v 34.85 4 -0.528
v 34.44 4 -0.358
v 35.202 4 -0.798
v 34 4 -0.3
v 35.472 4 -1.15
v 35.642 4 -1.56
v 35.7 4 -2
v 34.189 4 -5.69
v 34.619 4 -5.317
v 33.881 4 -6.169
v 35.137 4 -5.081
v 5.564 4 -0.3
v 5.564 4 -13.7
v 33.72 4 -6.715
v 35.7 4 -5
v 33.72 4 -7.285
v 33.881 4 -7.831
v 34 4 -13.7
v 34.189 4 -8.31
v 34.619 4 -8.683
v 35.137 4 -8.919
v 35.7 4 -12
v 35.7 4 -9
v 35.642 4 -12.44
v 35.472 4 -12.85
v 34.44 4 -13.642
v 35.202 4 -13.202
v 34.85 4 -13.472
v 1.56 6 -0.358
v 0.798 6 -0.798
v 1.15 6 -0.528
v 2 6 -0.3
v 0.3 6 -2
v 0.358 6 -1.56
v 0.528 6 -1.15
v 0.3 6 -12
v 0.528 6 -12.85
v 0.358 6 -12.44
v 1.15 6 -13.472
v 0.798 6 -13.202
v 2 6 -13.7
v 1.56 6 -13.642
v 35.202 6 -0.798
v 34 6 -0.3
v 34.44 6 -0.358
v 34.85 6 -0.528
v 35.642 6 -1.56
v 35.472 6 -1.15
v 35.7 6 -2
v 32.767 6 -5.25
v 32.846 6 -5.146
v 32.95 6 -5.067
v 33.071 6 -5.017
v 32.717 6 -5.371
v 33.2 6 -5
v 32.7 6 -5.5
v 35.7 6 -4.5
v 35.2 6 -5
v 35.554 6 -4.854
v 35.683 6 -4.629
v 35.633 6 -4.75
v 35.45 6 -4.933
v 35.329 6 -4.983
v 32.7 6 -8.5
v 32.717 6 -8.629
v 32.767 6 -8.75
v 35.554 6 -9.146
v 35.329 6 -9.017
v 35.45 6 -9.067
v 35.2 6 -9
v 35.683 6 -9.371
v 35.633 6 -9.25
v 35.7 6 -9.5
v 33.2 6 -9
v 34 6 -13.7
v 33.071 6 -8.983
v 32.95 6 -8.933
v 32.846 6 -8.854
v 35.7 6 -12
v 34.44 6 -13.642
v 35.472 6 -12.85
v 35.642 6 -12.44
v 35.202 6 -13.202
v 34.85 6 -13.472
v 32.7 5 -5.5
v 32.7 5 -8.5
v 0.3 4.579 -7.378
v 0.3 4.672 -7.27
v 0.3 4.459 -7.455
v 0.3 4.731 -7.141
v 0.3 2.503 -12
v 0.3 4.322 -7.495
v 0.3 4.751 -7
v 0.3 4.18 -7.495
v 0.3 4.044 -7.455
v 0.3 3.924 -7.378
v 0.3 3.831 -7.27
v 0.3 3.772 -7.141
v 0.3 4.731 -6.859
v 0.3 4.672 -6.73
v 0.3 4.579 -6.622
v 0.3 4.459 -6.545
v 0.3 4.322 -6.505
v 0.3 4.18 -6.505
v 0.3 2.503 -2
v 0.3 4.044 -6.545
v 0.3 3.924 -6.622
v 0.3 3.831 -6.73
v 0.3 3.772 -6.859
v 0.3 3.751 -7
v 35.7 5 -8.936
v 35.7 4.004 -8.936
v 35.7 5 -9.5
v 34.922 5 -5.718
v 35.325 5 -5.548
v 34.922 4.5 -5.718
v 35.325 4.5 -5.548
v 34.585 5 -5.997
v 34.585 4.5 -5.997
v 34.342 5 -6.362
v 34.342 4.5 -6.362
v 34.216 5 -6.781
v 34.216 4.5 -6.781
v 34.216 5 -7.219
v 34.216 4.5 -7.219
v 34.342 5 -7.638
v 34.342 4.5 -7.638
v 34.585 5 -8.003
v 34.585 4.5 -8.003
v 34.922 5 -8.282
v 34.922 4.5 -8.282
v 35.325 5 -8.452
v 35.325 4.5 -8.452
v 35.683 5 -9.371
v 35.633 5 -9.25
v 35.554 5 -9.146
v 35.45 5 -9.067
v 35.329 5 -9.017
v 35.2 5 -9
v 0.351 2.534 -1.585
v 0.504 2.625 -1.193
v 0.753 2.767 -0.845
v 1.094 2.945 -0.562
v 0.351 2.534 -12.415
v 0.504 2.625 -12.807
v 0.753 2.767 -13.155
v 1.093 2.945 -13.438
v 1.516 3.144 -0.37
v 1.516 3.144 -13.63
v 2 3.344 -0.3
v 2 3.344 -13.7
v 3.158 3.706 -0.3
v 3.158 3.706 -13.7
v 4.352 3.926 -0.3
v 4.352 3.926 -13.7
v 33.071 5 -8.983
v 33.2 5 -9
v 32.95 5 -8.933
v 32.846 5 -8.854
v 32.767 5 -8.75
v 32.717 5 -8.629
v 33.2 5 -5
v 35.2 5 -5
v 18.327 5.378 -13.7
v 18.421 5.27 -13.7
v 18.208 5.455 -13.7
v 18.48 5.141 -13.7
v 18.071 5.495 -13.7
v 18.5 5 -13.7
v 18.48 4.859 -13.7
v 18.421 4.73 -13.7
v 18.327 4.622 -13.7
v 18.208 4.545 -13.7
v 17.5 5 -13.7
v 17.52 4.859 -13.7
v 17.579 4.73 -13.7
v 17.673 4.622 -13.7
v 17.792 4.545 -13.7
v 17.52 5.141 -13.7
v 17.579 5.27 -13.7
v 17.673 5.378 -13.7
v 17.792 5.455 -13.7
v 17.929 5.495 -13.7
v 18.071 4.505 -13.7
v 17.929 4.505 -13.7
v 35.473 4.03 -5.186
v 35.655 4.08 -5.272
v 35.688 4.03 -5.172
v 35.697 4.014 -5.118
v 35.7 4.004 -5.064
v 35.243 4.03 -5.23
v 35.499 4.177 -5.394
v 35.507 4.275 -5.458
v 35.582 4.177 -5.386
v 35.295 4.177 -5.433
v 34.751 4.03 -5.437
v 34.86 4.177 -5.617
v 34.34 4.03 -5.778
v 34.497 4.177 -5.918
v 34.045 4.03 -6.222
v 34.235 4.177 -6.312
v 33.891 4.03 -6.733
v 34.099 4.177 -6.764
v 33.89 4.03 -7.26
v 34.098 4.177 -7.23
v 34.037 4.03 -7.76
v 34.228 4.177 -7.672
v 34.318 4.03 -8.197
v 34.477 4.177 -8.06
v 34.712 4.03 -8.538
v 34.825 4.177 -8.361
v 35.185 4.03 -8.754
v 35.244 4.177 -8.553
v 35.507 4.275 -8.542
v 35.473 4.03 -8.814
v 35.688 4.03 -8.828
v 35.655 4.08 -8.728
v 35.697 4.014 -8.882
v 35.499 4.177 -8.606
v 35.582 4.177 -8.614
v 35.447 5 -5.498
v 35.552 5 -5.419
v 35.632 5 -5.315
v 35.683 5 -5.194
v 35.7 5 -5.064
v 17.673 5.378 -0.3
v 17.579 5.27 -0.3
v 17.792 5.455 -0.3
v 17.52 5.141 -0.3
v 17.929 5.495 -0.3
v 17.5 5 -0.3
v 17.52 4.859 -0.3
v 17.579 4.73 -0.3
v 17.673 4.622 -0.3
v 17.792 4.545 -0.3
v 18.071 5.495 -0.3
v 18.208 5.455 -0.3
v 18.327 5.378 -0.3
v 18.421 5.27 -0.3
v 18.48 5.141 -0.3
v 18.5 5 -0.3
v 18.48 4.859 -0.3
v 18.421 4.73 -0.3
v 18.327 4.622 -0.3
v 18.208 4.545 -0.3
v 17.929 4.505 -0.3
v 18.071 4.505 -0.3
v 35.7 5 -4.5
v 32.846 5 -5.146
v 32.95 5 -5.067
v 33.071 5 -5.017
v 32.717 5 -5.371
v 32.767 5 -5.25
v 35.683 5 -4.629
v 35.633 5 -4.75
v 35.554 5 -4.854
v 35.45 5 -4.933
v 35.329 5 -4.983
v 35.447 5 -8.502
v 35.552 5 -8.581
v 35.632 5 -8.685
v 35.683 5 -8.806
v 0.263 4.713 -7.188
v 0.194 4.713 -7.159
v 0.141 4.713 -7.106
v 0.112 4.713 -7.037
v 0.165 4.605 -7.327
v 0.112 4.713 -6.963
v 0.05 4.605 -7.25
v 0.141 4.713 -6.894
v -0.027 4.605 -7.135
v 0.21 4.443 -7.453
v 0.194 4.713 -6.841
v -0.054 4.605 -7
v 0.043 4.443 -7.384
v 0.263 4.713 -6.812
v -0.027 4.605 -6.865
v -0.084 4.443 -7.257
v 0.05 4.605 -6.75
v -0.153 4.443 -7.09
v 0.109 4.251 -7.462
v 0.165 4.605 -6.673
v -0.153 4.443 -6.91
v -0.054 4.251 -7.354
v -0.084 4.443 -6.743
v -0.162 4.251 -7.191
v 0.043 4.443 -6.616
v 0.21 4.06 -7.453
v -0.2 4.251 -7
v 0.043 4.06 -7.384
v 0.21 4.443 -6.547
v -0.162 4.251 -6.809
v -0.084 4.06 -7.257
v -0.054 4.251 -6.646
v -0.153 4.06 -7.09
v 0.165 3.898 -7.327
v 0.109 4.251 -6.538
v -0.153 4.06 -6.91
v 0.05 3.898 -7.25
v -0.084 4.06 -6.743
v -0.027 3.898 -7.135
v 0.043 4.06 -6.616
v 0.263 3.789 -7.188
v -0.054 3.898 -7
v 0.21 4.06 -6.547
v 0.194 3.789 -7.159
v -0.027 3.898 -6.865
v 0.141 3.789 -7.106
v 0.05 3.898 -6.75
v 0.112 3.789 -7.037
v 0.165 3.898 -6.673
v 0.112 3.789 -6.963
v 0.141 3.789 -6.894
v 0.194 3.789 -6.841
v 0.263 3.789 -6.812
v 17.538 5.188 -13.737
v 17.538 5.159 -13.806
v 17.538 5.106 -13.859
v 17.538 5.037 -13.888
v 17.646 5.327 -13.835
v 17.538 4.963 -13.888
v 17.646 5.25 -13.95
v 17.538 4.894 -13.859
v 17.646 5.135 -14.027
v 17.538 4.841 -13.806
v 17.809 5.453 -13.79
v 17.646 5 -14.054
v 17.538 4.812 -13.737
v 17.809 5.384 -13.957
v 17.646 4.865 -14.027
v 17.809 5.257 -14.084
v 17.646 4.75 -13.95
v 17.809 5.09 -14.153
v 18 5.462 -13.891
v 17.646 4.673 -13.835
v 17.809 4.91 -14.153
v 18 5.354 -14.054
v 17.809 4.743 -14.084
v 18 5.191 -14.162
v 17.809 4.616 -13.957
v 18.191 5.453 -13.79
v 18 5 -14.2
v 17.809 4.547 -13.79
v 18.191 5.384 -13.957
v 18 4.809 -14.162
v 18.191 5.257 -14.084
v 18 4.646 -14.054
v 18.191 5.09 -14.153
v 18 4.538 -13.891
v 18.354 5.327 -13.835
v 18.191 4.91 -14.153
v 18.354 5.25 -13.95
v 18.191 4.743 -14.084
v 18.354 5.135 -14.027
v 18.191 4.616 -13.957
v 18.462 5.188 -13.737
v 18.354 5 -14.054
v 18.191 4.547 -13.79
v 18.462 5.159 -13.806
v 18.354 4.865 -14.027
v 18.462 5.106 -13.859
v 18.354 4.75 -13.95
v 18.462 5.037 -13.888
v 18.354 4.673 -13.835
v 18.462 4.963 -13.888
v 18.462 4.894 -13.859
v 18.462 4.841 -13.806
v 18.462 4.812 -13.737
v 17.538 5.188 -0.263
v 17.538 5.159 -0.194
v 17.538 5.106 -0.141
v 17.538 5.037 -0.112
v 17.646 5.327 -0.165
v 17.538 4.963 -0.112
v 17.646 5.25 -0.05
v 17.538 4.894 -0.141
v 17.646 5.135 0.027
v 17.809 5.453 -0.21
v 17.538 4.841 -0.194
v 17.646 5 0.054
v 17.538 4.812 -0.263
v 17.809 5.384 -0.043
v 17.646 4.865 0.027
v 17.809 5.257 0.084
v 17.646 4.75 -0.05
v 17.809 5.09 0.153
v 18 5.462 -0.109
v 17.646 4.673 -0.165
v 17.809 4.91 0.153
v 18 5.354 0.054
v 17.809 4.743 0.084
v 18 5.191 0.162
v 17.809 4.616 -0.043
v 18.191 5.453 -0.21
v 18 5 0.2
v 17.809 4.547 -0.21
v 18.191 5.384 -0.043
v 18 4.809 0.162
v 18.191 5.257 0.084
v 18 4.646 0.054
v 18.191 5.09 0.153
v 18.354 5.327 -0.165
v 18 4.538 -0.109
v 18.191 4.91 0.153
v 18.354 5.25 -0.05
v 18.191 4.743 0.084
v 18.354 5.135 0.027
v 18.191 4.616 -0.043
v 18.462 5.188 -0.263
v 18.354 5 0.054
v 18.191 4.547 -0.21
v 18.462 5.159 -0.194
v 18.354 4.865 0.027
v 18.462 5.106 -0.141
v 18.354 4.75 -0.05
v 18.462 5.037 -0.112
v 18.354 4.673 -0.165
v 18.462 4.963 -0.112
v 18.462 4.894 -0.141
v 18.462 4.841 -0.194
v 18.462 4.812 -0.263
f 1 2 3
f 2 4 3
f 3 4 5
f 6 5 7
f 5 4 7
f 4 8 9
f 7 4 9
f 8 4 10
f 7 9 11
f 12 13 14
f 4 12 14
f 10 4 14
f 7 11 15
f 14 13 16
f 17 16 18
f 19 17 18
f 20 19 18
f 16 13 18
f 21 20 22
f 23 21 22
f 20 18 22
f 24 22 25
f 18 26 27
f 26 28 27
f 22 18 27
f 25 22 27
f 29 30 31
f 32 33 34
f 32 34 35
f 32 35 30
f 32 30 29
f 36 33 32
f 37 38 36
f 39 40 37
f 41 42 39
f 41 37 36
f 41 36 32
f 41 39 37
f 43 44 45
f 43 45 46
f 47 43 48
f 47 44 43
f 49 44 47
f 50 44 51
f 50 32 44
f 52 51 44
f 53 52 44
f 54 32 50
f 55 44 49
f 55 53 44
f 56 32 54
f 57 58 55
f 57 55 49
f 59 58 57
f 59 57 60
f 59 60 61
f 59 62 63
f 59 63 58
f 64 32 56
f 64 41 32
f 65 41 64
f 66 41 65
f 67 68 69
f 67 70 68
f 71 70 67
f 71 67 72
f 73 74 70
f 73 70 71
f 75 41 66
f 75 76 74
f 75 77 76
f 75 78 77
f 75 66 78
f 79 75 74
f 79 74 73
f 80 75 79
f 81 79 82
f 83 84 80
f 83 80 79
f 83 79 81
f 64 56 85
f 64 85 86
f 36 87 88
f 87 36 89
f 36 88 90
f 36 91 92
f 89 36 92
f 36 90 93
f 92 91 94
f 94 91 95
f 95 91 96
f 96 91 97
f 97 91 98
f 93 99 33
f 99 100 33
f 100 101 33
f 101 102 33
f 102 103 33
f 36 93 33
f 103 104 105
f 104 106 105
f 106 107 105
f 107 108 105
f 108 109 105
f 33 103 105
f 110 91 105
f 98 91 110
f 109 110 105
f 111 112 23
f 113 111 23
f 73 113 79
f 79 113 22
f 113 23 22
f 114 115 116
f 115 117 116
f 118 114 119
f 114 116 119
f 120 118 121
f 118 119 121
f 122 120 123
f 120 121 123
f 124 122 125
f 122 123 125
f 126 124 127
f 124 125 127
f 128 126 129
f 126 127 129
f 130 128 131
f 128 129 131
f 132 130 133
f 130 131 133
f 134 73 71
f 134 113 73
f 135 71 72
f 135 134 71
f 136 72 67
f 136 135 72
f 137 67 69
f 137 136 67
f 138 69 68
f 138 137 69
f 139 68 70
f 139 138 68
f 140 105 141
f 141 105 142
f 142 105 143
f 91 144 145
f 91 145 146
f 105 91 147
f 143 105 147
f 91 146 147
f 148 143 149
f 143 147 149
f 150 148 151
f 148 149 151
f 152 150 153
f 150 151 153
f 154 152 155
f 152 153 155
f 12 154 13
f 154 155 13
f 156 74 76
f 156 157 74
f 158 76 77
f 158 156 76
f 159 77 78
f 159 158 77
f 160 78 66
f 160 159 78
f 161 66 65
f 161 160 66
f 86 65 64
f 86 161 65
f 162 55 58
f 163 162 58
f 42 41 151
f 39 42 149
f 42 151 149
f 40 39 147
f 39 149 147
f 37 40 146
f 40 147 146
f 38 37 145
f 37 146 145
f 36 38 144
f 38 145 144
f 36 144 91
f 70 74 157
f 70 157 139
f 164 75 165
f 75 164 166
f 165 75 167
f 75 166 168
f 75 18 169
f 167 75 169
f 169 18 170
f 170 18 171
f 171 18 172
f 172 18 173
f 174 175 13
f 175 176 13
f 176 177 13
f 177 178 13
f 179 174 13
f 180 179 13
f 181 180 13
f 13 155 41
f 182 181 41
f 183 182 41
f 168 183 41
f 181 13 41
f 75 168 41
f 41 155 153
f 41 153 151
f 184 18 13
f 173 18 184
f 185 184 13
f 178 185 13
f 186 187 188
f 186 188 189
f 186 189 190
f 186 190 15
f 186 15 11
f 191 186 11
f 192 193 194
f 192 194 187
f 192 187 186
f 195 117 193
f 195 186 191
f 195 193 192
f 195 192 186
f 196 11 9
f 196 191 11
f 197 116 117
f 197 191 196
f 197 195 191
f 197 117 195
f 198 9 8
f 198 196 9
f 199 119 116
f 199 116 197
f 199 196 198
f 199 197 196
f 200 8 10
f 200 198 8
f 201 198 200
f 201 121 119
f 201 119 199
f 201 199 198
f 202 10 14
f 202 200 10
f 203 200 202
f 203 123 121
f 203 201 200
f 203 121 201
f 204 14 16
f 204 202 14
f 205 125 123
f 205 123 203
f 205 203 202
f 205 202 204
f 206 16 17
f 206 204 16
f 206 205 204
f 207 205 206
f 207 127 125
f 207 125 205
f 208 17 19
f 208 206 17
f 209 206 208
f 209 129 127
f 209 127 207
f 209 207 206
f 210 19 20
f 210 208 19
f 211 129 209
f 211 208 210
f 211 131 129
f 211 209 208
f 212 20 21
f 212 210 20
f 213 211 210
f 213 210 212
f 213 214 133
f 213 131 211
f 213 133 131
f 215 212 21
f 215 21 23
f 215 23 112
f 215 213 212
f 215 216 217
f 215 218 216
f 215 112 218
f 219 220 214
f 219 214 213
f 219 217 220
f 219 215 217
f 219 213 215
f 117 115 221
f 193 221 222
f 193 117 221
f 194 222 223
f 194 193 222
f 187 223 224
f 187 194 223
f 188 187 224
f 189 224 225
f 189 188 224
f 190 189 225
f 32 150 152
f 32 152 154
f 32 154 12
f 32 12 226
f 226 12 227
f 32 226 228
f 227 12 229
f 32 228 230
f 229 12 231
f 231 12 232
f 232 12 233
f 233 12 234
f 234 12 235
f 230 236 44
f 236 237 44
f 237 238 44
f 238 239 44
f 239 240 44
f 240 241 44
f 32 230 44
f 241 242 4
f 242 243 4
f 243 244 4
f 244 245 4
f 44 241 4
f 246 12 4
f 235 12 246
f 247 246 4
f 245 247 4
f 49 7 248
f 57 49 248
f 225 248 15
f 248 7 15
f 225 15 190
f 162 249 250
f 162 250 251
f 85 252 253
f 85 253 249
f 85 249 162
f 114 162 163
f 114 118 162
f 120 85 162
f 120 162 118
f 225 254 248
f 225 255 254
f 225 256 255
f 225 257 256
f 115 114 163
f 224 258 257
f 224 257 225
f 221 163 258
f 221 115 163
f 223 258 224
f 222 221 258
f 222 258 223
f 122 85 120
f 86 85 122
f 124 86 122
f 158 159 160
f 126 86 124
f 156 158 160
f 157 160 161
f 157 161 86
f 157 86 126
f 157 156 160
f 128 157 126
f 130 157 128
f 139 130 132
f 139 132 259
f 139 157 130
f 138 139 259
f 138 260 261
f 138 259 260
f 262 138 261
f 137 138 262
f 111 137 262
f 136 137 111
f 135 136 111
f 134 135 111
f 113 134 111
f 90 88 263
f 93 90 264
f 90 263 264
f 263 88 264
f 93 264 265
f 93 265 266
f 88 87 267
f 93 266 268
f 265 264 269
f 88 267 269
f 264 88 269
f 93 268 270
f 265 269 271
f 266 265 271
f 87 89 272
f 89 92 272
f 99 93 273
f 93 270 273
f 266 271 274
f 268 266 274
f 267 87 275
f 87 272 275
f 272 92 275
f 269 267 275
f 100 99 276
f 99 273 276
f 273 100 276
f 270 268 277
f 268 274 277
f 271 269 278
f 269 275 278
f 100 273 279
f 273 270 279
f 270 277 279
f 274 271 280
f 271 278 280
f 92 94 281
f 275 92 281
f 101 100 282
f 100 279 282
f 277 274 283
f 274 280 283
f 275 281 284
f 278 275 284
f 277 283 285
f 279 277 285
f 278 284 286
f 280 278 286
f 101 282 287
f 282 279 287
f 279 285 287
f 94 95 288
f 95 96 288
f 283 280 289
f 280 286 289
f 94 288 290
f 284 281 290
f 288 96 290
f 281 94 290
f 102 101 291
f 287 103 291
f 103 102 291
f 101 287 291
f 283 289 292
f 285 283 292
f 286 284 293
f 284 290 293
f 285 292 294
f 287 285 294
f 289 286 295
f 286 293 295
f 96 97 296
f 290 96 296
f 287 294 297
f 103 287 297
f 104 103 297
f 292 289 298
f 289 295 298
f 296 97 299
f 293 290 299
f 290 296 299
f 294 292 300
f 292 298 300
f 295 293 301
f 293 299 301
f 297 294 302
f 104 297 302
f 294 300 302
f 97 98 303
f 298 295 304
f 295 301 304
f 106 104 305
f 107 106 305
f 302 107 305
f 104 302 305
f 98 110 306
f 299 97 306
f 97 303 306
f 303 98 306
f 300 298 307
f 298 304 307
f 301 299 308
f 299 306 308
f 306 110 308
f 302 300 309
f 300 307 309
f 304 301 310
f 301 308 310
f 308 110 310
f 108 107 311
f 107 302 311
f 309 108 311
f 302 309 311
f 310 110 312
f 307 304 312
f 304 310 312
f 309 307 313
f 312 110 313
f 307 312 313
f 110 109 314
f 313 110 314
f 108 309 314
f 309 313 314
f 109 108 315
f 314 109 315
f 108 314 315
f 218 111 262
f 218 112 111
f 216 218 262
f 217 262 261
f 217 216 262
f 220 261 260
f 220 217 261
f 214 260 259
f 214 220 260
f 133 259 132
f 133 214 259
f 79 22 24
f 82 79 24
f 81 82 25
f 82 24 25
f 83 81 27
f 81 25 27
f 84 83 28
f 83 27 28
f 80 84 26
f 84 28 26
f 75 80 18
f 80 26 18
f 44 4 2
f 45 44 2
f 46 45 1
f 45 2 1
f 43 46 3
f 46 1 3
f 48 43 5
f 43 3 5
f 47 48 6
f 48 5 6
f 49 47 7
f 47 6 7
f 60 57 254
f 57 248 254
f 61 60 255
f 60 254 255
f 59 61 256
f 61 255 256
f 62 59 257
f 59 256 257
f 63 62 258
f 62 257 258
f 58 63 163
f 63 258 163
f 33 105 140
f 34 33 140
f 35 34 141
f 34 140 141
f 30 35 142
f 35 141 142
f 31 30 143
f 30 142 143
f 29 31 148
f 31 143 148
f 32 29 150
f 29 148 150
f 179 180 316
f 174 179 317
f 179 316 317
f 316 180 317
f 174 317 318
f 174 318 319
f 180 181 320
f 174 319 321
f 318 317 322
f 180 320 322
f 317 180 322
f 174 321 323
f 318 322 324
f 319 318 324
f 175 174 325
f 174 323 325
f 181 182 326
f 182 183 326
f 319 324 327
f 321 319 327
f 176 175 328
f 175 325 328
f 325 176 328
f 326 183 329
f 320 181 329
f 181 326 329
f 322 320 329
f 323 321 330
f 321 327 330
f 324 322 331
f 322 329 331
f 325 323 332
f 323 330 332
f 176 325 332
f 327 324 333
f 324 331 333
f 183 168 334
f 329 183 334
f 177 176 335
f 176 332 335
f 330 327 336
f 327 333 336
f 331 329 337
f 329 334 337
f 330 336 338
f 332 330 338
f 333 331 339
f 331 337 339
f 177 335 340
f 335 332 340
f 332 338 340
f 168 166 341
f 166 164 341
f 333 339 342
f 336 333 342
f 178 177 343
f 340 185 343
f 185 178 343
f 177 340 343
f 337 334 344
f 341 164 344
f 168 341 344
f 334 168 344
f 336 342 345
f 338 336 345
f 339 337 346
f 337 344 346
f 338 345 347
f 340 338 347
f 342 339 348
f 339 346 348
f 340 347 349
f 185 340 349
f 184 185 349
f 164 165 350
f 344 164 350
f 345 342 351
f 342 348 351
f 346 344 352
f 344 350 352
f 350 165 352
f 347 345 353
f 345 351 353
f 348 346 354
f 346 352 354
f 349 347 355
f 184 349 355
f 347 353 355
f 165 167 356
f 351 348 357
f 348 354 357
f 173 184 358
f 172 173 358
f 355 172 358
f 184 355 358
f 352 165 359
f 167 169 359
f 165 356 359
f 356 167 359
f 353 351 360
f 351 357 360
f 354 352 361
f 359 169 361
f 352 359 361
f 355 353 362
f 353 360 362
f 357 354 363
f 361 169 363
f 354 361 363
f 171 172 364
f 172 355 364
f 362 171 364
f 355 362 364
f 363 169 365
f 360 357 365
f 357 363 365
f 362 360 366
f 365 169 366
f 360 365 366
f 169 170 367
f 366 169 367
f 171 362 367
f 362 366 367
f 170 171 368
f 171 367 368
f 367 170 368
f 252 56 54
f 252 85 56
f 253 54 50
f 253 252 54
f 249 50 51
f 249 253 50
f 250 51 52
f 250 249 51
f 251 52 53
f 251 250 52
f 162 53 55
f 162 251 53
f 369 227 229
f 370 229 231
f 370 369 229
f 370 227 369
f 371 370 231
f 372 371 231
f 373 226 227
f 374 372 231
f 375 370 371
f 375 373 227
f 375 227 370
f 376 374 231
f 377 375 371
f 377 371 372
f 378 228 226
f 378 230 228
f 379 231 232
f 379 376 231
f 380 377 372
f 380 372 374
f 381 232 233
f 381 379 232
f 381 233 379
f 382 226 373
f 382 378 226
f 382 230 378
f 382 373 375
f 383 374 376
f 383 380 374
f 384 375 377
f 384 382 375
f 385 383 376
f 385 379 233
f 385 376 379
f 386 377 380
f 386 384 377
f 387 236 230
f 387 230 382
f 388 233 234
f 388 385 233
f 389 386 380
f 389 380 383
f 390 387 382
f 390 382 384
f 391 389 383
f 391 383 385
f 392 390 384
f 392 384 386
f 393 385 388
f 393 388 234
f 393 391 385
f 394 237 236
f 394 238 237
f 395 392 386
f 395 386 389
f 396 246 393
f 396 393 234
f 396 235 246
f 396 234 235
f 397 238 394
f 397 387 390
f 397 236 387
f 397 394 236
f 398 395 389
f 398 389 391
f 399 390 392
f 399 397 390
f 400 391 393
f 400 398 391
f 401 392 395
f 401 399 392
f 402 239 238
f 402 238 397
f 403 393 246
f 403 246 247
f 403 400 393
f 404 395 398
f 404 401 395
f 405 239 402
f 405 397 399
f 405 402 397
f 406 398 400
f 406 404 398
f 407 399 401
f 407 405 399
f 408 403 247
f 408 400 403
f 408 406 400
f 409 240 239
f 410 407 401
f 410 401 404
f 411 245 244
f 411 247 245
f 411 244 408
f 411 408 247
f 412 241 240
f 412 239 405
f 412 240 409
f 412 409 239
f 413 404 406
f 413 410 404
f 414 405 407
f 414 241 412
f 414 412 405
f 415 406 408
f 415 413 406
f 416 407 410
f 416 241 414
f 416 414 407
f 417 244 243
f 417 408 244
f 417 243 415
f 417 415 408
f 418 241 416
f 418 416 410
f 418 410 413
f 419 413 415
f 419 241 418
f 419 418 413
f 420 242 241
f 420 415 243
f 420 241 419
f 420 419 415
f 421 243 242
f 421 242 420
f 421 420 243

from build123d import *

# Parameters (mm, degrees)
AUFSATZ_LINEAR_AUSTRAGEN1_DEPTH = 6
SCHNITT_LINEAR_AUSTRAGEN1_DEPTH = 39.601165786
SKIZZE5_R                       = 1.5
SCHNITT_LINEAR_AUSTRAGEN2_DEPTH = 39.472457686
SKIZZE6_W                       = 3
SKIZZE6_H                       = 4
SCHNITT_LINEAR_AUSTRAGEN3_DEPTH = 1
VERRUNDUNG2_R                   = 0.5


with BuildPart() as part:
    # Skizze1 → Aufsatz-Linear austragen1 (new body)
    with BuildSketch(Plane(origin=(0, 0, 0), x_dir=(1, 0, 0), z_dir=(0, 1, 0))):
        with BuildLine():
            Line((2, 0.3), (34, 0.3))
            ThreePointArc((34, 0.3), (35.202081528, 0.797918472), (35.7, 2))
            Line((35.7, 2), (35.7, 12))
            ThreePointArc((35.7, 12), (35.202081528, 13.202081528), (34, 13.7))
            Line((34, 13.7), (2, 13.7))
            ThreePointArc((2, 13.7), (0.797918472, 13.202081528), (0.3, 12))
            Line((0.3, 12), (0.3, 2))
            ThreePointArc((0.3, 2), (0.797918472, 0.797918472), (2, 0.3))
        make_face()
    extrude(amount=AUFSATZ_LINEAR_AUSTRAGEN1_DEPTH)

    # Skizze2 → Schnitt-Linear austragen1 (cut, through all)
    with BuildSketch(Plane(origin=(0, 0, -13.7), x_dir=(-1, 0, 0), z_dir=(0, 0, -1))):
        with BuildLine():
            Line((-35.7, 0), (2.436435526, 0))
            ThreePointArc((2.436435526, 0), (-1.091428519, 2.94427191), (-5.563564474, 4))
            Line((-5.563564474, 4), (-35.7, 4))
            Line((-35.7, 4), (-35.7, 0))
        make_face()
    extrude(amount=-SCHNITT_LINEAR_AUSTRAGEN1_DEPTH, mode=Mode.SUBTRACT)

    # Skizze3 → Rotation1 (revolve)
    with BuildSketch(Plane(origin=(0, 0, -13.7), x_dir=(-1, 0, 0), z_dir=(0, 0, -1))):
        with BuildLine():
            Line((-18.5, 5), (-17.5, 5))
            ThreePointArc((-17.5, 5), (-18, 5.5), (-18.5, 5))
        make_face()
    rotation1 = revolve(axis=Axis((35.7, 5, -13.7), (-1, 0, 0)))

    # Skizze4 → Rotation2 (revolve)
    with BuildSketch(Plane.ZY.offset(-0.3)):
        with BuildLine():
            Line((-7, 3.75132006), (-7, 4.75132006))
            ThreePointArc((-7, 4.75132006), (-7.5, 4.25132006), (-7, 3.75132006))
        make_face()
    revolve(axis=Axis((0.3, 2.502640121, -7), (0, 1, 0)))

    # Spiegeln1: Rotation1 across plane
    add(rotation1.mirror(Plane(origin=(0, 0, -7), x_dir=(1, 0, 0), z_dir=(0, 0, -1))))

    # Skizze5 → Schnitt-Linear austragen2 (cut, through all)
    with BuildSketch(Plane.XZ.offset(-4)):
        with Locations((35.7, -7)):
            Circle(SKIZZE5_R)
    extrude(amount=-SCHNITT_LINEAR_AUSTRAGEN2_DEPTH, mode=Mode.SUBTRACT)

    # Skizze6 → Schnitt-Linear austragen3 (cut)
    with BuildSketch(Plane(origin=(0, 6, 0), x_dir=(1, 0, 0), z_dir=(0, 1, 0))):
        with Locations((34.2, 7)):
            Rectangle(SKIZZE6_W, SKIZZE6_H)
    extrude(amount=-SCHNITT_LINEAR_AUSTRAGEN3_DEPTH, mode=Mode.SUBTRACT)

    # Verrundung2
    verrundung2_edges = [part.edges().sort_by_distance(p)[0] for p in [
        (34.2, 4, -7),
        (35.7, 4.5, -5.5),
        (35.7, 4.5, -8.5),
        (35.7, 5.5, -9),
        (35.7, 5.5, -5),
        (32.7, 5.5, -5),
        (32.7, 5.5, -9),
    ]]
    fillet(verrundung2_edges, radius=VERRUNDUNG2_R)


solid = part.part
